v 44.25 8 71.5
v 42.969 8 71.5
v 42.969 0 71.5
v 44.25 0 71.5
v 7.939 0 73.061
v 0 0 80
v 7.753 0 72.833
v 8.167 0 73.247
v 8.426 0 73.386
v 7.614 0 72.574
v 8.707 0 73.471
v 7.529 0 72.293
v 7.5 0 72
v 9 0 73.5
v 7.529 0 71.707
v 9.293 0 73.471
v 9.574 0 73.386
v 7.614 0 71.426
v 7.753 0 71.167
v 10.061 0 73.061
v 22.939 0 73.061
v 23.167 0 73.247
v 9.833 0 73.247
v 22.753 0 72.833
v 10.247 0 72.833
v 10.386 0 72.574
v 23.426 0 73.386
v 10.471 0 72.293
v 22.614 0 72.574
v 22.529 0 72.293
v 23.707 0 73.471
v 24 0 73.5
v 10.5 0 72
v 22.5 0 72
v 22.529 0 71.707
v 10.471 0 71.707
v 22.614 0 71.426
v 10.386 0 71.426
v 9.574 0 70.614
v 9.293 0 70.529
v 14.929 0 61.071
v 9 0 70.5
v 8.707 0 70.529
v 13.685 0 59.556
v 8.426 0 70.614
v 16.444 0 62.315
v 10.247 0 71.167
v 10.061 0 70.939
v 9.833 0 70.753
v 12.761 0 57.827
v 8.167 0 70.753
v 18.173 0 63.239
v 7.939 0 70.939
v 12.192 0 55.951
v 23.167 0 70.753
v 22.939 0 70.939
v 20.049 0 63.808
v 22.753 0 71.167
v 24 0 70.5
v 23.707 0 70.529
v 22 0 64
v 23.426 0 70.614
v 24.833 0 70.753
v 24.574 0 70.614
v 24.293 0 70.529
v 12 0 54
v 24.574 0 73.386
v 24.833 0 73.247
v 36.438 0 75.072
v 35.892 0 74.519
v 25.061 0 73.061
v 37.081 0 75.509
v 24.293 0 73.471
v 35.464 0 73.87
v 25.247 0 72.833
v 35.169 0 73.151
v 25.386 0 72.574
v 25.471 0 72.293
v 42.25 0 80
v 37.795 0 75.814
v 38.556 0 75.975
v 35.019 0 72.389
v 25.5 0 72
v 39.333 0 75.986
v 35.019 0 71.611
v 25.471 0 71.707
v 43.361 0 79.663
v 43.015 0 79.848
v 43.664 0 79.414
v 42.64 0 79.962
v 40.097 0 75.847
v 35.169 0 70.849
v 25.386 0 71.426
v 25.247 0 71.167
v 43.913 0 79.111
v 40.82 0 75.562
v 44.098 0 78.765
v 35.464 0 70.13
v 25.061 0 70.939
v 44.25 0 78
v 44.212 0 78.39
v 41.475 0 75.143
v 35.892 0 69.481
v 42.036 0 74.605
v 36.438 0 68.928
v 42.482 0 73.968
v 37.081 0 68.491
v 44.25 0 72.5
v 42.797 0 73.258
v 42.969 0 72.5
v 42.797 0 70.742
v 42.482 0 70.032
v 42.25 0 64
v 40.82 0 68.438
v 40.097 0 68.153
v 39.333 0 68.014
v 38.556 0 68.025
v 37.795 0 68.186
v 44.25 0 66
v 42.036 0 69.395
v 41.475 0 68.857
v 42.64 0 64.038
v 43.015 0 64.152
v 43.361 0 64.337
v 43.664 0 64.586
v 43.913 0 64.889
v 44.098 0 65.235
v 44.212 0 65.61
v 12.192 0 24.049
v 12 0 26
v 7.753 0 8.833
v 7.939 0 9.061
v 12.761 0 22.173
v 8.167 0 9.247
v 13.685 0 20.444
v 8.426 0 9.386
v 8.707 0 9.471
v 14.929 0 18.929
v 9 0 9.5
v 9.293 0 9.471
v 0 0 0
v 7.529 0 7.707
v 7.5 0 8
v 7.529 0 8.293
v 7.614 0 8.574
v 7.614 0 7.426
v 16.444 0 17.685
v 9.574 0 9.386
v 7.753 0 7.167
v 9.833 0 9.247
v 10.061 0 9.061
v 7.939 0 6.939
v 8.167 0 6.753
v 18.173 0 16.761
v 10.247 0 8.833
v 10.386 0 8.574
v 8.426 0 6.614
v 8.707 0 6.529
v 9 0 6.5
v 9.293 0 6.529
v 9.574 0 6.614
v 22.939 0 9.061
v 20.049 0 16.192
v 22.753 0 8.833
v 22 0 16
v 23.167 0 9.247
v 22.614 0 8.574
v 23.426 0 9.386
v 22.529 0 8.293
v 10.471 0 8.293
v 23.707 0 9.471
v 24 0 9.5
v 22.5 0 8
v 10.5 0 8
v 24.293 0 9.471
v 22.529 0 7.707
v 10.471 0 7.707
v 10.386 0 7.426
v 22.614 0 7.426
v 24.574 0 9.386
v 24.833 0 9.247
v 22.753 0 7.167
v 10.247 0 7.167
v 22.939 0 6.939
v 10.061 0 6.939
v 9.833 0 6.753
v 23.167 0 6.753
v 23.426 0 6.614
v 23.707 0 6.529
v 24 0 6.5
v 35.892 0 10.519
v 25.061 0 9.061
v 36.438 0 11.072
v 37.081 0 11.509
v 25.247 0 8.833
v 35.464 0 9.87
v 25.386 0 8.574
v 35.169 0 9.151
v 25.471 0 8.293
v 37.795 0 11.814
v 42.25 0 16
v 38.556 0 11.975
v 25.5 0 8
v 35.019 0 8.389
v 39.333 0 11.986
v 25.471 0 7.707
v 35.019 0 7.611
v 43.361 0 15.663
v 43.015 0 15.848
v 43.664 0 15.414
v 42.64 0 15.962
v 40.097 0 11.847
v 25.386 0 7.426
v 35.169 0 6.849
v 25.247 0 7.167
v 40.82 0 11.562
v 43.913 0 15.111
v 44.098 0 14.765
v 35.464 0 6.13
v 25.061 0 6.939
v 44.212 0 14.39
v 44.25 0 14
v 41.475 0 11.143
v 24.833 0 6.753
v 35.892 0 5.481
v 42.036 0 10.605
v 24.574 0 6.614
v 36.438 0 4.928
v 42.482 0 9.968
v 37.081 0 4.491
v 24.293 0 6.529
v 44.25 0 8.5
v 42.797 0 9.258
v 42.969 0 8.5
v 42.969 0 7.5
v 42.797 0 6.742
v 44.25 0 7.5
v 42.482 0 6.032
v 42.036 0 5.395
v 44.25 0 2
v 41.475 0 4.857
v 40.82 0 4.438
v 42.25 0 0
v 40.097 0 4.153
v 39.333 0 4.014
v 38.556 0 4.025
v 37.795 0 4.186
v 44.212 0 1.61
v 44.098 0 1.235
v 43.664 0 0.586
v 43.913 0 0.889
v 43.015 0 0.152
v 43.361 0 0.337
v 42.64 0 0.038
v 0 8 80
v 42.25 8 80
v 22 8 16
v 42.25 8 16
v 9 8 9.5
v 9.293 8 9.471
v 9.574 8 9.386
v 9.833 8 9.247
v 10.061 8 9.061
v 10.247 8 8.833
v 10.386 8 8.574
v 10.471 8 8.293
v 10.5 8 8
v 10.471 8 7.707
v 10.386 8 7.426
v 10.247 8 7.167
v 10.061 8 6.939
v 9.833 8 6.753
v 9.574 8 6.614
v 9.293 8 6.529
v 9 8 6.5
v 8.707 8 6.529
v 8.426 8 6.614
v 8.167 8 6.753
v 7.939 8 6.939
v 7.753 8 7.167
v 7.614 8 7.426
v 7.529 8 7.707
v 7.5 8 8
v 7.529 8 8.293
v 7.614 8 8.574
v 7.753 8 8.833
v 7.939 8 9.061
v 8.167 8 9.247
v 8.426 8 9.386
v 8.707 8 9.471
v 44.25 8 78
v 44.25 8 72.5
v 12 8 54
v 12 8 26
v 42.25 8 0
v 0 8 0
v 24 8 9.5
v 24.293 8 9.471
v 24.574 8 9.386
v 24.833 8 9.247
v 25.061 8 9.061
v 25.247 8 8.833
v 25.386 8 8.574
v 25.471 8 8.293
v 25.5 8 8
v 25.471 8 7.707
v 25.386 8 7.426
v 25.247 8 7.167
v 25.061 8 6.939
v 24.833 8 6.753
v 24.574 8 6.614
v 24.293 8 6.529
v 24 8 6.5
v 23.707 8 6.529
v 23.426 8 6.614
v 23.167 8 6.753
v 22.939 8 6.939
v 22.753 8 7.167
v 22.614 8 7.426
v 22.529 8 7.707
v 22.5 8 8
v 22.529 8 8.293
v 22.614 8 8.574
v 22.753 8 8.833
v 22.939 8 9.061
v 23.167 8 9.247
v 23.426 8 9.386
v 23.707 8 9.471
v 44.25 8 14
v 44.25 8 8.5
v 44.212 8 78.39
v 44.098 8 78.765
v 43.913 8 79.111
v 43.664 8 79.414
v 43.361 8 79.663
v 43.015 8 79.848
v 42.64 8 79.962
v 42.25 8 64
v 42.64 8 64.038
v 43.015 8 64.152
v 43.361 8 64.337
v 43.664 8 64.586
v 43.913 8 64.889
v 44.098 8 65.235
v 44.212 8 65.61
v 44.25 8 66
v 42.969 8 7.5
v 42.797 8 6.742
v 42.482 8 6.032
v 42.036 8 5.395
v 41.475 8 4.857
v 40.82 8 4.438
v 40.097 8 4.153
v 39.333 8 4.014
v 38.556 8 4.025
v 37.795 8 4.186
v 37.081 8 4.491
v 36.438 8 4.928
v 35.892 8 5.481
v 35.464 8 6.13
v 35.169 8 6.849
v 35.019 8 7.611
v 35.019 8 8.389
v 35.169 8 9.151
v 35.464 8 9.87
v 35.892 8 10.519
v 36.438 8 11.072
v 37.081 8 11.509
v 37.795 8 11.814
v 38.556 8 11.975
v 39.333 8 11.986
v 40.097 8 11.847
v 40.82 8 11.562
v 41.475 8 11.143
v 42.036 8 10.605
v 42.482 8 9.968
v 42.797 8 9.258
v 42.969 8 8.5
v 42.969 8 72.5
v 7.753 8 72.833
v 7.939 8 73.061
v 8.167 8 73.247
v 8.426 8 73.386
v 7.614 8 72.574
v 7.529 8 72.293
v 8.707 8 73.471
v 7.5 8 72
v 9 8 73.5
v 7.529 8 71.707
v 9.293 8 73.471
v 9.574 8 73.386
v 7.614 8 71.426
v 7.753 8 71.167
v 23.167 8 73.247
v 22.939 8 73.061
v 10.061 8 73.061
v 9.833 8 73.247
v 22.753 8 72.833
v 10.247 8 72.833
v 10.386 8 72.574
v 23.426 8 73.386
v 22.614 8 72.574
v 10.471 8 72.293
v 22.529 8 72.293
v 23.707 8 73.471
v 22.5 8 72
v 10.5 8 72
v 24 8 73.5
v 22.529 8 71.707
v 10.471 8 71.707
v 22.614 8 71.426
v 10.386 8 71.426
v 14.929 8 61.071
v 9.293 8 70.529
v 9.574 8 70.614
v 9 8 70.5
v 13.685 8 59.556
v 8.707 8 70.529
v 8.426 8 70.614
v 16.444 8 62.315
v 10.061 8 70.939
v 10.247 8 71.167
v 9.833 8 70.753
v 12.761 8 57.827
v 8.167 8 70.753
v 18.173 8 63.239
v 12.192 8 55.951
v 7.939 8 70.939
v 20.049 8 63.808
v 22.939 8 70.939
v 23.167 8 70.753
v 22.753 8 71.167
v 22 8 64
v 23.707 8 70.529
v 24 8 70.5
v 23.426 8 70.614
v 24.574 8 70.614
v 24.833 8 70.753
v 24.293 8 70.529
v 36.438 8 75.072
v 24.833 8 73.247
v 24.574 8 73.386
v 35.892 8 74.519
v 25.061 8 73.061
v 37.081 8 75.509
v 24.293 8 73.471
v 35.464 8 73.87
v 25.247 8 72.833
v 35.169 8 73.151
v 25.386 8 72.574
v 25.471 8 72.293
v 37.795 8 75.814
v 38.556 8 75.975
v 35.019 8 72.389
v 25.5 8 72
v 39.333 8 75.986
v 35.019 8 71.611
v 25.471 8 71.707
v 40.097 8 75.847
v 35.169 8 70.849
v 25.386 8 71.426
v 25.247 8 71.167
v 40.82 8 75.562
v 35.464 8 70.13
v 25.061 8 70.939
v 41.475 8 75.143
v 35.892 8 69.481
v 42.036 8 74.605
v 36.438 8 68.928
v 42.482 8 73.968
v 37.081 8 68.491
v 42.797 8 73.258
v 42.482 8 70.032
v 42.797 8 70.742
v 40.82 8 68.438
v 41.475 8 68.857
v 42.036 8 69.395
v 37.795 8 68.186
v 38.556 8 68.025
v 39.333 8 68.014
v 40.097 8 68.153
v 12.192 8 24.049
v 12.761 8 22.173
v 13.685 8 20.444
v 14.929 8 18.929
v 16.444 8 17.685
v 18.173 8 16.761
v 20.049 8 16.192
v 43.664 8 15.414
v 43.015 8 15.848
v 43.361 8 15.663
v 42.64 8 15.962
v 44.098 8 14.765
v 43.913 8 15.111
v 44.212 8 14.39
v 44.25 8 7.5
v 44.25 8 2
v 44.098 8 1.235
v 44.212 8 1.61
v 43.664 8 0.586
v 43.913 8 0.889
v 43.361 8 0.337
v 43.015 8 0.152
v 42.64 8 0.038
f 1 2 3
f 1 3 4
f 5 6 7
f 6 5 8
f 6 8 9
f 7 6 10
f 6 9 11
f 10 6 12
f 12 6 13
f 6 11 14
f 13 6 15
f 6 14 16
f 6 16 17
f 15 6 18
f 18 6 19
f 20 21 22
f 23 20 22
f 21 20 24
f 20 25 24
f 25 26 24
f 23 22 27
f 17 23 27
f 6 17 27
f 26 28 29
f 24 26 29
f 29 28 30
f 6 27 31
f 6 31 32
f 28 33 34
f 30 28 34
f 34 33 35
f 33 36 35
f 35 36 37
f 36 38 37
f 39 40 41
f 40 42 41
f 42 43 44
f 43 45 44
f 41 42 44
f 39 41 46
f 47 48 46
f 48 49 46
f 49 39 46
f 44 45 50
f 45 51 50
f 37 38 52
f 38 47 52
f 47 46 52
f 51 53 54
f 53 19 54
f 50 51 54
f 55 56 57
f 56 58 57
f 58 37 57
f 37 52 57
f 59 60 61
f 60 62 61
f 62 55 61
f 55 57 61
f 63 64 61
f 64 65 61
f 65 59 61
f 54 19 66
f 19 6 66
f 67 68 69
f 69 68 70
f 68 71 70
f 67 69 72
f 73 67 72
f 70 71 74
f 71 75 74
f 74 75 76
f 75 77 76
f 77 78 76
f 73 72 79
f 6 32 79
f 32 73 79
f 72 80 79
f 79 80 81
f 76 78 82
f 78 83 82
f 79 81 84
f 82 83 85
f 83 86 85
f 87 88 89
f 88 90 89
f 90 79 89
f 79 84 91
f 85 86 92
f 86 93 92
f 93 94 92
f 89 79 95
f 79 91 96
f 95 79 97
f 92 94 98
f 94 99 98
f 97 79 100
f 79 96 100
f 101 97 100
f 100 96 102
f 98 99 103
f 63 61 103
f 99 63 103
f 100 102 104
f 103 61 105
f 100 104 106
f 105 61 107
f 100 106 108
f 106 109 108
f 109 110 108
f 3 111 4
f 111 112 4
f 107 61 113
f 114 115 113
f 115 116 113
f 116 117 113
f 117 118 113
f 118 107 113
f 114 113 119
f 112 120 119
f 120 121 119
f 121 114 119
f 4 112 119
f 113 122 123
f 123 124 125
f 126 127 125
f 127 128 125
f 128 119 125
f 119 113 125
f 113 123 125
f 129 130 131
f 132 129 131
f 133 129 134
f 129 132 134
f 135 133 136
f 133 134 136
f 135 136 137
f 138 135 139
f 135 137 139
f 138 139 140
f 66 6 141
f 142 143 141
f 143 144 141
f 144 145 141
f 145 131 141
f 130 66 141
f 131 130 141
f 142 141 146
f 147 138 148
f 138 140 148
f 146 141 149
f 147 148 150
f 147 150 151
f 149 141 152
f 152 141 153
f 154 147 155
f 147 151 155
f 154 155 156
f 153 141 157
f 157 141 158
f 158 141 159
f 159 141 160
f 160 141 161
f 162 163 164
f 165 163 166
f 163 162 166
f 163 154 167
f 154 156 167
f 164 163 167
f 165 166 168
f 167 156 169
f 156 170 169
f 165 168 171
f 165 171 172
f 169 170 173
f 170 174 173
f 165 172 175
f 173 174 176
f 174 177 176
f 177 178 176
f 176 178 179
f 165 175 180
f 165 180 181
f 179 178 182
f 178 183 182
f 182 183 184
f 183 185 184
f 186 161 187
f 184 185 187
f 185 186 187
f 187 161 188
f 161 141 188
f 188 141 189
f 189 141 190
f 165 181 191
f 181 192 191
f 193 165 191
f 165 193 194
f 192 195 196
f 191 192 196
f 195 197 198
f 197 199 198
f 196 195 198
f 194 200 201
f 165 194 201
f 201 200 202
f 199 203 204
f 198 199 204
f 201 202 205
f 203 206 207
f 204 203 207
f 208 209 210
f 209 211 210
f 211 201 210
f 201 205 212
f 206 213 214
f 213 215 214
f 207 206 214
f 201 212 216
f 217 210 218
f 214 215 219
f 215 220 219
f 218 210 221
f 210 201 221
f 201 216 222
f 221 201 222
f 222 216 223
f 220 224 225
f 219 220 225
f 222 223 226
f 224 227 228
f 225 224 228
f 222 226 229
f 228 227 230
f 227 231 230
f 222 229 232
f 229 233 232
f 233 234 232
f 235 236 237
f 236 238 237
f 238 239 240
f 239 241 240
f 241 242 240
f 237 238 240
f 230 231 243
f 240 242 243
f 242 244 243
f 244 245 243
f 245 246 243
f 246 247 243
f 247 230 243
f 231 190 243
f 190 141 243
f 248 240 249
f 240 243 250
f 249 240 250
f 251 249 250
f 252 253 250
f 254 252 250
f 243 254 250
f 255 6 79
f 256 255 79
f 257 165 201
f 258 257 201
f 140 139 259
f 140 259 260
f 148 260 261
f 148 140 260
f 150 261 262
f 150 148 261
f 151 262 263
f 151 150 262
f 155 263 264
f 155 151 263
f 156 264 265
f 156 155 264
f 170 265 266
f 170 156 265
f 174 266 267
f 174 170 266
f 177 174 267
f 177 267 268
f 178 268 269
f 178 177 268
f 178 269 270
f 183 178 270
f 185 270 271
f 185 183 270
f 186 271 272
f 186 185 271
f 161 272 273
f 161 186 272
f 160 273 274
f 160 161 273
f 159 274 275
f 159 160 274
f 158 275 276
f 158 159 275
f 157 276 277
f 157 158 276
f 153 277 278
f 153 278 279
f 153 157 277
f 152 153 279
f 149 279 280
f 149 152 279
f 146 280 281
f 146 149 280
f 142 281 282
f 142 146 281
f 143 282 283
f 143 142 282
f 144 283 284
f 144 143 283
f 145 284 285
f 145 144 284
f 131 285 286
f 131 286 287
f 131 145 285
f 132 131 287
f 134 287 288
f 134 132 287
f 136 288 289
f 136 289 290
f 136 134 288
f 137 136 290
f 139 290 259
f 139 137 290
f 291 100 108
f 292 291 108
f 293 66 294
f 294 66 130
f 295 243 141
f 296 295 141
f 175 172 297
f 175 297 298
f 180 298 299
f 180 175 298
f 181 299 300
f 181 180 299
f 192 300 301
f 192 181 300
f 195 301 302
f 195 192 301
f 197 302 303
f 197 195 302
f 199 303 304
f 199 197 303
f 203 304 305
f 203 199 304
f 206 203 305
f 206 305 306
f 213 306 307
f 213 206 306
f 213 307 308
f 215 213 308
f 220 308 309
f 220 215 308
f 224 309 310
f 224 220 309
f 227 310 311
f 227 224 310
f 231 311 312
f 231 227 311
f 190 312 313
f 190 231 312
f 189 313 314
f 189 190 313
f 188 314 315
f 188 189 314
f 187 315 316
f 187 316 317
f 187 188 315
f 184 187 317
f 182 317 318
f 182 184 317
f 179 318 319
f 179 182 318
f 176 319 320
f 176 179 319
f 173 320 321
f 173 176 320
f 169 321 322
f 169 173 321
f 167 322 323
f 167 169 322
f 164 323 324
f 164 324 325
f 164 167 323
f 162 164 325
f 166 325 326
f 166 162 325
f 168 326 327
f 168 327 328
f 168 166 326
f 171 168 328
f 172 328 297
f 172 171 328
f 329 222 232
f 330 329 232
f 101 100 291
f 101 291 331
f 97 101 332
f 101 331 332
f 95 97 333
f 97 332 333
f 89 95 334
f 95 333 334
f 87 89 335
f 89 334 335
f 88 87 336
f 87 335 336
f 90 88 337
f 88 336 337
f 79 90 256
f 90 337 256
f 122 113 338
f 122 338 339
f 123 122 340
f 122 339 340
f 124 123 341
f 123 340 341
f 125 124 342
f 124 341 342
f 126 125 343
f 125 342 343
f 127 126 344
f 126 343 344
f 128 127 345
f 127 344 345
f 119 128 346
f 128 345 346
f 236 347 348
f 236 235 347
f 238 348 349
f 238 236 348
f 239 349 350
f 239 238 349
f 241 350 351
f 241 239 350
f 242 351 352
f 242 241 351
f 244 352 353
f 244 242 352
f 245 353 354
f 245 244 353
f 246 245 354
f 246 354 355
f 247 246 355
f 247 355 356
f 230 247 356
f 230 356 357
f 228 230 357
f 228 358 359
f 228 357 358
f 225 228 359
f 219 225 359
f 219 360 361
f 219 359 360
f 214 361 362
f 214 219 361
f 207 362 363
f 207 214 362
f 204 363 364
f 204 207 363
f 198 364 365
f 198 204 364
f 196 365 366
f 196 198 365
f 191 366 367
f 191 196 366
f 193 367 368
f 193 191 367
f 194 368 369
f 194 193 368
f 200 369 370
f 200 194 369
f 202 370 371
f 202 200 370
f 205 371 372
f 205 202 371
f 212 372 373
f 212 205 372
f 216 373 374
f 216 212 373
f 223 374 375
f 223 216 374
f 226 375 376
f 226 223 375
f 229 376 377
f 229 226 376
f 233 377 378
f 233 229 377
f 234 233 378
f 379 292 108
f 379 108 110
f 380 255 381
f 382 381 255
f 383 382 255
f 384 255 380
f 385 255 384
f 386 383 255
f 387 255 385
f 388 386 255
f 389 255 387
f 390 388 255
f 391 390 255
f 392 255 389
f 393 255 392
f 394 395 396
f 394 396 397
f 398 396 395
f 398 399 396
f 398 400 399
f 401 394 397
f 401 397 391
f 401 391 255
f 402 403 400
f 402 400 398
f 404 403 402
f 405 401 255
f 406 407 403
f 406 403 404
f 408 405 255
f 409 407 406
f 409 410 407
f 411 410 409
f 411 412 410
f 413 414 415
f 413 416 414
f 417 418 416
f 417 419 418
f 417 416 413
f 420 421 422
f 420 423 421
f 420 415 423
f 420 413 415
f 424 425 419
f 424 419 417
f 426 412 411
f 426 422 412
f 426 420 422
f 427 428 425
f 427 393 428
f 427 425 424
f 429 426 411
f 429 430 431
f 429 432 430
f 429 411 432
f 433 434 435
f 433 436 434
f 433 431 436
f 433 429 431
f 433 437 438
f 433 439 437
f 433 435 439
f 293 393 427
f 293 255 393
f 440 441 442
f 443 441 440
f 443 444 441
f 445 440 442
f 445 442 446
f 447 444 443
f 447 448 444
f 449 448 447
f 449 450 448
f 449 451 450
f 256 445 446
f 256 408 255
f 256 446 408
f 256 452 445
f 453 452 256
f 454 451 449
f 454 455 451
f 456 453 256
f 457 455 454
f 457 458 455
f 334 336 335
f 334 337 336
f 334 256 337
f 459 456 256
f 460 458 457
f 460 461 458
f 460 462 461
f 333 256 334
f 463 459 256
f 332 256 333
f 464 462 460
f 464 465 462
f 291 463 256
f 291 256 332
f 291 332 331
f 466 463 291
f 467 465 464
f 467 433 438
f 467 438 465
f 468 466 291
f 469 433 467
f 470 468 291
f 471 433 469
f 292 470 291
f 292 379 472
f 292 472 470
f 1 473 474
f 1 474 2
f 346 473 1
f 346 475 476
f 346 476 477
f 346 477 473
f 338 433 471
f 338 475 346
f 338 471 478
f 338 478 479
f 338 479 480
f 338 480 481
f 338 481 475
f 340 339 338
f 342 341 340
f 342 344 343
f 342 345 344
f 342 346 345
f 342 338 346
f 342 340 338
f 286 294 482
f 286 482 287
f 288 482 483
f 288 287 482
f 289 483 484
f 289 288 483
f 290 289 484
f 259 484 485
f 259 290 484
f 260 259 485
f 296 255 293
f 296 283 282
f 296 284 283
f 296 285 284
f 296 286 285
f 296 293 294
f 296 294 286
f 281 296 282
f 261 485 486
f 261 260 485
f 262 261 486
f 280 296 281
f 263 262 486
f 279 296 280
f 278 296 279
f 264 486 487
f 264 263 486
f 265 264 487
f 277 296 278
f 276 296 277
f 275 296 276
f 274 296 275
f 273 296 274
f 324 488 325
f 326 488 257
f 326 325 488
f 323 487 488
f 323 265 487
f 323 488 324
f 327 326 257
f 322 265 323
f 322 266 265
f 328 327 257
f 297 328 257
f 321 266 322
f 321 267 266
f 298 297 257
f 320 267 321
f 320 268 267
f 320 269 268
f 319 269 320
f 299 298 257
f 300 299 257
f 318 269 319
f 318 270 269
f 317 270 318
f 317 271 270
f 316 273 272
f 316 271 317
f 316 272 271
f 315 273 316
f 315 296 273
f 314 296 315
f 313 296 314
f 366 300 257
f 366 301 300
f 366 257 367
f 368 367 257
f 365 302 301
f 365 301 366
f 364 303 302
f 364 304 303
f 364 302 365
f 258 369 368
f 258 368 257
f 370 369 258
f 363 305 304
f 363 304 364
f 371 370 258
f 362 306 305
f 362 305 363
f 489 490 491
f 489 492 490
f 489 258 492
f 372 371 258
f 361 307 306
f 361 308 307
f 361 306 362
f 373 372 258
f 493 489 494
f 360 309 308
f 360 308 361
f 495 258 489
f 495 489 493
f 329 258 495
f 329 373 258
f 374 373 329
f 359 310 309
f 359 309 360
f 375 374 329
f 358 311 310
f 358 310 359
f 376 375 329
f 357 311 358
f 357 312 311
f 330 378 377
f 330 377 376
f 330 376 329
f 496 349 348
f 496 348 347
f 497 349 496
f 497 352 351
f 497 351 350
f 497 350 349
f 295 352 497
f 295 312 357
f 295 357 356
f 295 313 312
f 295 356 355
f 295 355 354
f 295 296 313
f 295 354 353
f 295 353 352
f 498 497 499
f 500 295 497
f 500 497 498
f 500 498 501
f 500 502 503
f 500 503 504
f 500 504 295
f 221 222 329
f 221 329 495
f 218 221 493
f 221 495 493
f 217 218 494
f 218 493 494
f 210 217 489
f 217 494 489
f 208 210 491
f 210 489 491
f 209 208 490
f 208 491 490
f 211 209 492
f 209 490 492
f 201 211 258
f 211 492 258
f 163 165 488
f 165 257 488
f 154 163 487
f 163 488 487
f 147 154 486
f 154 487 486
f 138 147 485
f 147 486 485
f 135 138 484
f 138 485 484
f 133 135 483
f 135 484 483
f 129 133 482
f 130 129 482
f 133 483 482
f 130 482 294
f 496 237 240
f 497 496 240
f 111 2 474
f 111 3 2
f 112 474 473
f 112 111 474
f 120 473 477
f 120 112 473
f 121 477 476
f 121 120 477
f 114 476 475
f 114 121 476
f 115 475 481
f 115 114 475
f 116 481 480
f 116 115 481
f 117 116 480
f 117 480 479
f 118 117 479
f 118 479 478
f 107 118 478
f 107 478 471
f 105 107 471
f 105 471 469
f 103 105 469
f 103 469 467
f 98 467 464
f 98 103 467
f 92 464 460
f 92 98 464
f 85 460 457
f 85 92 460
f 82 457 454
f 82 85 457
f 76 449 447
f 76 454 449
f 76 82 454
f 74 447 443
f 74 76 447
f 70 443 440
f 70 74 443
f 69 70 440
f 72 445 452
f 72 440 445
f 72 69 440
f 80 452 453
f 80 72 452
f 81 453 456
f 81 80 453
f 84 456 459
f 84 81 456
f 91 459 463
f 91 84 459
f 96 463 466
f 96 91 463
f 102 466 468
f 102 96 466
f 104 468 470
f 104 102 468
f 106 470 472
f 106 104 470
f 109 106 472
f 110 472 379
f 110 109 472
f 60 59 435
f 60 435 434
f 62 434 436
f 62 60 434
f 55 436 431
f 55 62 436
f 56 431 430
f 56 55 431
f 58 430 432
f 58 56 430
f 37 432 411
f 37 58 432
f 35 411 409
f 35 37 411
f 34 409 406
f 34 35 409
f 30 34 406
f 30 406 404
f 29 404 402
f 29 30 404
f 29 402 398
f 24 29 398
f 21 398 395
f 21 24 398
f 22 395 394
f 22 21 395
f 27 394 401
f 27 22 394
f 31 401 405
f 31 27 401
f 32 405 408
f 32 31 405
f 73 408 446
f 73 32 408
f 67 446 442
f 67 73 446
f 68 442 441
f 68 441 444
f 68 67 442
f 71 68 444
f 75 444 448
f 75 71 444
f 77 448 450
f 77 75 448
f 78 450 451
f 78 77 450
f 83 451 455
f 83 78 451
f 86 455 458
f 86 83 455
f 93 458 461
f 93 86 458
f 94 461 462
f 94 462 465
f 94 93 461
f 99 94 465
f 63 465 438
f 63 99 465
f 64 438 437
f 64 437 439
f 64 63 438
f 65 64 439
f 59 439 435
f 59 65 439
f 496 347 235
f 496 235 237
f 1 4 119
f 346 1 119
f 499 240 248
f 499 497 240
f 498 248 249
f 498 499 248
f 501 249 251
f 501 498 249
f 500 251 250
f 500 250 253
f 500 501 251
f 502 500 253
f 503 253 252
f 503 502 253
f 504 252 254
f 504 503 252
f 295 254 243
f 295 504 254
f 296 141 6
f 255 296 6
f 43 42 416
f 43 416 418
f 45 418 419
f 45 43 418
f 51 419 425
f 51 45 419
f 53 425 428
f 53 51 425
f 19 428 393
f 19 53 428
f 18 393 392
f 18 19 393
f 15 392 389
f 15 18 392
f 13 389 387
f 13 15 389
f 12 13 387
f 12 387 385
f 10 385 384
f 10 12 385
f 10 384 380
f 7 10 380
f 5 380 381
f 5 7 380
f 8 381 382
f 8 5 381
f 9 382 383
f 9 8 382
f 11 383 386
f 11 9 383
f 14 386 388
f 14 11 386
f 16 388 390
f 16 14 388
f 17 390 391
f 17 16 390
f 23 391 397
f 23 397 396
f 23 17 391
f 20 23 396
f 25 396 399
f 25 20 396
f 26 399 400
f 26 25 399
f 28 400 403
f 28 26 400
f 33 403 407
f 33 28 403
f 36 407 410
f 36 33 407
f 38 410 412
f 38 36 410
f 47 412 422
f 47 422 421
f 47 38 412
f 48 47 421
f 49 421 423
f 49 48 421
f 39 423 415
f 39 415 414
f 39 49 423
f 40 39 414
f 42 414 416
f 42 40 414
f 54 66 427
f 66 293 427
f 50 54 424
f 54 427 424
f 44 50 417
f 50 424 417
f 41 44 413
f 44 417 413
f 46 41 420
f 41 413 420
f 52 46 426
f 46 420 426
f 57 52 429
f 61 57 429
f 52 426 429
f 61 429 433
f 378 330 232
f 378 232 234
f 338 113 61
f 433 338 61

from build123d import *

# Parameters (mm, degrees)
SKETCH1_R           = 4
SKETCH1_R_2         = 1.5
BOSS_EXTRUDE1_DEPTH = 8
CUT_EXTRUDE2_DEPTH  = 92.771795776
FILLET1_R           = 2
FILLET2_R           = 10


with BuildPart() as part:
    # Sketch1 → Boss-Extrude1 (new body)
    with BuildSketch(Plane(origin=(0, 0, 0), x_dir=(1, 0, 0), z_dir=(0, 1, 0))):
        Polygon((0, 0), (0, -80), (44.25, -80), (44.25, -64), (12, -64), (12, -16), (44.25, -16), (44.25, 0), align=None)
        with Locations(Location((39, -8, 0), (0, 0, 270))):
            Circle(SKETCH1_R, mode=Mode.SUBTRACT)
        with Locations(Location((39, -72, 0), (0, 0, 90))):
            Circle(SKETCH1_R, mode=Mode.SUBTRACT)
        with Locations(Location((24, -8, 0), (0, 0, 270))):
            Circle(SKETCH1_R_2, mode=Mode.SUBTRACT)
        with Locations(Location((9, -8, 0), (0, 0, 270))):
            Circle(SKETCH1_R_2, mode=Mode.SUBTRACT)
        with Locations(Location((24, -72, 0), (0, 0, 90))):
            Circle(SKETCH1_R_2, mode=Mode.SUBTRACT)
        with Locations(Location((9, -72, 0), (0, 0, 90))):
            Circle(SKETCH1_R_2, mode=Mode.SUBTRACT)
    extrude(amount=BOSS_EXTRUDE1_DEPTH)

    # Sketch4 → Cut-Extrude2 (cut, through all)
    with BuildSketch(Plane(origin=(0, 8, 0), x_dir=(1, 0, 0), z_dir=(0, 1, 0))):
        with BuildLine():
            Line((39, -7.5), (44.25, -7.5))
            ThreePointArc((44.25, -7.5), (44.75, -8), (44.25, -8.5))
            Line((44.25, -8.5), (39, -8.5))
            ThreePointArc((39, -8.5), (38.5, -8), (39, -7.5))
        make_face()
        with BuildLine():
            Line((39, -71.5), (44.25, -71.5))
            ThreePointArc((44.25, -71.5), (44.75, -72), (44.25, -72.5))
            Line((44.25, -72.5), (39, -72.5))
            ThreePointArc((39, -72.5), (38.5, -72), (39, -71.5))
        make_face()
    extrude(amount=-CUT_EXTRUDE2_DEPTH, mode=Mode.SUBTRACT)

    # Fillet1
    fillet1_edges = [part.edges().sort_by_distance(p)[0] for p in [
        (44.25, 4, 0),
        (44.25, 4, 16),
        (44.25, 4, 64),
        (44.25, 4, 80),
    ]]
    fillet(fillet1_edges, radius=FILLET1_R)

    # Fillet2
    fillet2_edges = [part.edges().sort_by_distance(p)[0] for p in [
        (12, 4, 16),
        (12, 4, 64),
    ]]
    fillet(fillet2_edges, radius=FILLET2_R)


solid = part.part
